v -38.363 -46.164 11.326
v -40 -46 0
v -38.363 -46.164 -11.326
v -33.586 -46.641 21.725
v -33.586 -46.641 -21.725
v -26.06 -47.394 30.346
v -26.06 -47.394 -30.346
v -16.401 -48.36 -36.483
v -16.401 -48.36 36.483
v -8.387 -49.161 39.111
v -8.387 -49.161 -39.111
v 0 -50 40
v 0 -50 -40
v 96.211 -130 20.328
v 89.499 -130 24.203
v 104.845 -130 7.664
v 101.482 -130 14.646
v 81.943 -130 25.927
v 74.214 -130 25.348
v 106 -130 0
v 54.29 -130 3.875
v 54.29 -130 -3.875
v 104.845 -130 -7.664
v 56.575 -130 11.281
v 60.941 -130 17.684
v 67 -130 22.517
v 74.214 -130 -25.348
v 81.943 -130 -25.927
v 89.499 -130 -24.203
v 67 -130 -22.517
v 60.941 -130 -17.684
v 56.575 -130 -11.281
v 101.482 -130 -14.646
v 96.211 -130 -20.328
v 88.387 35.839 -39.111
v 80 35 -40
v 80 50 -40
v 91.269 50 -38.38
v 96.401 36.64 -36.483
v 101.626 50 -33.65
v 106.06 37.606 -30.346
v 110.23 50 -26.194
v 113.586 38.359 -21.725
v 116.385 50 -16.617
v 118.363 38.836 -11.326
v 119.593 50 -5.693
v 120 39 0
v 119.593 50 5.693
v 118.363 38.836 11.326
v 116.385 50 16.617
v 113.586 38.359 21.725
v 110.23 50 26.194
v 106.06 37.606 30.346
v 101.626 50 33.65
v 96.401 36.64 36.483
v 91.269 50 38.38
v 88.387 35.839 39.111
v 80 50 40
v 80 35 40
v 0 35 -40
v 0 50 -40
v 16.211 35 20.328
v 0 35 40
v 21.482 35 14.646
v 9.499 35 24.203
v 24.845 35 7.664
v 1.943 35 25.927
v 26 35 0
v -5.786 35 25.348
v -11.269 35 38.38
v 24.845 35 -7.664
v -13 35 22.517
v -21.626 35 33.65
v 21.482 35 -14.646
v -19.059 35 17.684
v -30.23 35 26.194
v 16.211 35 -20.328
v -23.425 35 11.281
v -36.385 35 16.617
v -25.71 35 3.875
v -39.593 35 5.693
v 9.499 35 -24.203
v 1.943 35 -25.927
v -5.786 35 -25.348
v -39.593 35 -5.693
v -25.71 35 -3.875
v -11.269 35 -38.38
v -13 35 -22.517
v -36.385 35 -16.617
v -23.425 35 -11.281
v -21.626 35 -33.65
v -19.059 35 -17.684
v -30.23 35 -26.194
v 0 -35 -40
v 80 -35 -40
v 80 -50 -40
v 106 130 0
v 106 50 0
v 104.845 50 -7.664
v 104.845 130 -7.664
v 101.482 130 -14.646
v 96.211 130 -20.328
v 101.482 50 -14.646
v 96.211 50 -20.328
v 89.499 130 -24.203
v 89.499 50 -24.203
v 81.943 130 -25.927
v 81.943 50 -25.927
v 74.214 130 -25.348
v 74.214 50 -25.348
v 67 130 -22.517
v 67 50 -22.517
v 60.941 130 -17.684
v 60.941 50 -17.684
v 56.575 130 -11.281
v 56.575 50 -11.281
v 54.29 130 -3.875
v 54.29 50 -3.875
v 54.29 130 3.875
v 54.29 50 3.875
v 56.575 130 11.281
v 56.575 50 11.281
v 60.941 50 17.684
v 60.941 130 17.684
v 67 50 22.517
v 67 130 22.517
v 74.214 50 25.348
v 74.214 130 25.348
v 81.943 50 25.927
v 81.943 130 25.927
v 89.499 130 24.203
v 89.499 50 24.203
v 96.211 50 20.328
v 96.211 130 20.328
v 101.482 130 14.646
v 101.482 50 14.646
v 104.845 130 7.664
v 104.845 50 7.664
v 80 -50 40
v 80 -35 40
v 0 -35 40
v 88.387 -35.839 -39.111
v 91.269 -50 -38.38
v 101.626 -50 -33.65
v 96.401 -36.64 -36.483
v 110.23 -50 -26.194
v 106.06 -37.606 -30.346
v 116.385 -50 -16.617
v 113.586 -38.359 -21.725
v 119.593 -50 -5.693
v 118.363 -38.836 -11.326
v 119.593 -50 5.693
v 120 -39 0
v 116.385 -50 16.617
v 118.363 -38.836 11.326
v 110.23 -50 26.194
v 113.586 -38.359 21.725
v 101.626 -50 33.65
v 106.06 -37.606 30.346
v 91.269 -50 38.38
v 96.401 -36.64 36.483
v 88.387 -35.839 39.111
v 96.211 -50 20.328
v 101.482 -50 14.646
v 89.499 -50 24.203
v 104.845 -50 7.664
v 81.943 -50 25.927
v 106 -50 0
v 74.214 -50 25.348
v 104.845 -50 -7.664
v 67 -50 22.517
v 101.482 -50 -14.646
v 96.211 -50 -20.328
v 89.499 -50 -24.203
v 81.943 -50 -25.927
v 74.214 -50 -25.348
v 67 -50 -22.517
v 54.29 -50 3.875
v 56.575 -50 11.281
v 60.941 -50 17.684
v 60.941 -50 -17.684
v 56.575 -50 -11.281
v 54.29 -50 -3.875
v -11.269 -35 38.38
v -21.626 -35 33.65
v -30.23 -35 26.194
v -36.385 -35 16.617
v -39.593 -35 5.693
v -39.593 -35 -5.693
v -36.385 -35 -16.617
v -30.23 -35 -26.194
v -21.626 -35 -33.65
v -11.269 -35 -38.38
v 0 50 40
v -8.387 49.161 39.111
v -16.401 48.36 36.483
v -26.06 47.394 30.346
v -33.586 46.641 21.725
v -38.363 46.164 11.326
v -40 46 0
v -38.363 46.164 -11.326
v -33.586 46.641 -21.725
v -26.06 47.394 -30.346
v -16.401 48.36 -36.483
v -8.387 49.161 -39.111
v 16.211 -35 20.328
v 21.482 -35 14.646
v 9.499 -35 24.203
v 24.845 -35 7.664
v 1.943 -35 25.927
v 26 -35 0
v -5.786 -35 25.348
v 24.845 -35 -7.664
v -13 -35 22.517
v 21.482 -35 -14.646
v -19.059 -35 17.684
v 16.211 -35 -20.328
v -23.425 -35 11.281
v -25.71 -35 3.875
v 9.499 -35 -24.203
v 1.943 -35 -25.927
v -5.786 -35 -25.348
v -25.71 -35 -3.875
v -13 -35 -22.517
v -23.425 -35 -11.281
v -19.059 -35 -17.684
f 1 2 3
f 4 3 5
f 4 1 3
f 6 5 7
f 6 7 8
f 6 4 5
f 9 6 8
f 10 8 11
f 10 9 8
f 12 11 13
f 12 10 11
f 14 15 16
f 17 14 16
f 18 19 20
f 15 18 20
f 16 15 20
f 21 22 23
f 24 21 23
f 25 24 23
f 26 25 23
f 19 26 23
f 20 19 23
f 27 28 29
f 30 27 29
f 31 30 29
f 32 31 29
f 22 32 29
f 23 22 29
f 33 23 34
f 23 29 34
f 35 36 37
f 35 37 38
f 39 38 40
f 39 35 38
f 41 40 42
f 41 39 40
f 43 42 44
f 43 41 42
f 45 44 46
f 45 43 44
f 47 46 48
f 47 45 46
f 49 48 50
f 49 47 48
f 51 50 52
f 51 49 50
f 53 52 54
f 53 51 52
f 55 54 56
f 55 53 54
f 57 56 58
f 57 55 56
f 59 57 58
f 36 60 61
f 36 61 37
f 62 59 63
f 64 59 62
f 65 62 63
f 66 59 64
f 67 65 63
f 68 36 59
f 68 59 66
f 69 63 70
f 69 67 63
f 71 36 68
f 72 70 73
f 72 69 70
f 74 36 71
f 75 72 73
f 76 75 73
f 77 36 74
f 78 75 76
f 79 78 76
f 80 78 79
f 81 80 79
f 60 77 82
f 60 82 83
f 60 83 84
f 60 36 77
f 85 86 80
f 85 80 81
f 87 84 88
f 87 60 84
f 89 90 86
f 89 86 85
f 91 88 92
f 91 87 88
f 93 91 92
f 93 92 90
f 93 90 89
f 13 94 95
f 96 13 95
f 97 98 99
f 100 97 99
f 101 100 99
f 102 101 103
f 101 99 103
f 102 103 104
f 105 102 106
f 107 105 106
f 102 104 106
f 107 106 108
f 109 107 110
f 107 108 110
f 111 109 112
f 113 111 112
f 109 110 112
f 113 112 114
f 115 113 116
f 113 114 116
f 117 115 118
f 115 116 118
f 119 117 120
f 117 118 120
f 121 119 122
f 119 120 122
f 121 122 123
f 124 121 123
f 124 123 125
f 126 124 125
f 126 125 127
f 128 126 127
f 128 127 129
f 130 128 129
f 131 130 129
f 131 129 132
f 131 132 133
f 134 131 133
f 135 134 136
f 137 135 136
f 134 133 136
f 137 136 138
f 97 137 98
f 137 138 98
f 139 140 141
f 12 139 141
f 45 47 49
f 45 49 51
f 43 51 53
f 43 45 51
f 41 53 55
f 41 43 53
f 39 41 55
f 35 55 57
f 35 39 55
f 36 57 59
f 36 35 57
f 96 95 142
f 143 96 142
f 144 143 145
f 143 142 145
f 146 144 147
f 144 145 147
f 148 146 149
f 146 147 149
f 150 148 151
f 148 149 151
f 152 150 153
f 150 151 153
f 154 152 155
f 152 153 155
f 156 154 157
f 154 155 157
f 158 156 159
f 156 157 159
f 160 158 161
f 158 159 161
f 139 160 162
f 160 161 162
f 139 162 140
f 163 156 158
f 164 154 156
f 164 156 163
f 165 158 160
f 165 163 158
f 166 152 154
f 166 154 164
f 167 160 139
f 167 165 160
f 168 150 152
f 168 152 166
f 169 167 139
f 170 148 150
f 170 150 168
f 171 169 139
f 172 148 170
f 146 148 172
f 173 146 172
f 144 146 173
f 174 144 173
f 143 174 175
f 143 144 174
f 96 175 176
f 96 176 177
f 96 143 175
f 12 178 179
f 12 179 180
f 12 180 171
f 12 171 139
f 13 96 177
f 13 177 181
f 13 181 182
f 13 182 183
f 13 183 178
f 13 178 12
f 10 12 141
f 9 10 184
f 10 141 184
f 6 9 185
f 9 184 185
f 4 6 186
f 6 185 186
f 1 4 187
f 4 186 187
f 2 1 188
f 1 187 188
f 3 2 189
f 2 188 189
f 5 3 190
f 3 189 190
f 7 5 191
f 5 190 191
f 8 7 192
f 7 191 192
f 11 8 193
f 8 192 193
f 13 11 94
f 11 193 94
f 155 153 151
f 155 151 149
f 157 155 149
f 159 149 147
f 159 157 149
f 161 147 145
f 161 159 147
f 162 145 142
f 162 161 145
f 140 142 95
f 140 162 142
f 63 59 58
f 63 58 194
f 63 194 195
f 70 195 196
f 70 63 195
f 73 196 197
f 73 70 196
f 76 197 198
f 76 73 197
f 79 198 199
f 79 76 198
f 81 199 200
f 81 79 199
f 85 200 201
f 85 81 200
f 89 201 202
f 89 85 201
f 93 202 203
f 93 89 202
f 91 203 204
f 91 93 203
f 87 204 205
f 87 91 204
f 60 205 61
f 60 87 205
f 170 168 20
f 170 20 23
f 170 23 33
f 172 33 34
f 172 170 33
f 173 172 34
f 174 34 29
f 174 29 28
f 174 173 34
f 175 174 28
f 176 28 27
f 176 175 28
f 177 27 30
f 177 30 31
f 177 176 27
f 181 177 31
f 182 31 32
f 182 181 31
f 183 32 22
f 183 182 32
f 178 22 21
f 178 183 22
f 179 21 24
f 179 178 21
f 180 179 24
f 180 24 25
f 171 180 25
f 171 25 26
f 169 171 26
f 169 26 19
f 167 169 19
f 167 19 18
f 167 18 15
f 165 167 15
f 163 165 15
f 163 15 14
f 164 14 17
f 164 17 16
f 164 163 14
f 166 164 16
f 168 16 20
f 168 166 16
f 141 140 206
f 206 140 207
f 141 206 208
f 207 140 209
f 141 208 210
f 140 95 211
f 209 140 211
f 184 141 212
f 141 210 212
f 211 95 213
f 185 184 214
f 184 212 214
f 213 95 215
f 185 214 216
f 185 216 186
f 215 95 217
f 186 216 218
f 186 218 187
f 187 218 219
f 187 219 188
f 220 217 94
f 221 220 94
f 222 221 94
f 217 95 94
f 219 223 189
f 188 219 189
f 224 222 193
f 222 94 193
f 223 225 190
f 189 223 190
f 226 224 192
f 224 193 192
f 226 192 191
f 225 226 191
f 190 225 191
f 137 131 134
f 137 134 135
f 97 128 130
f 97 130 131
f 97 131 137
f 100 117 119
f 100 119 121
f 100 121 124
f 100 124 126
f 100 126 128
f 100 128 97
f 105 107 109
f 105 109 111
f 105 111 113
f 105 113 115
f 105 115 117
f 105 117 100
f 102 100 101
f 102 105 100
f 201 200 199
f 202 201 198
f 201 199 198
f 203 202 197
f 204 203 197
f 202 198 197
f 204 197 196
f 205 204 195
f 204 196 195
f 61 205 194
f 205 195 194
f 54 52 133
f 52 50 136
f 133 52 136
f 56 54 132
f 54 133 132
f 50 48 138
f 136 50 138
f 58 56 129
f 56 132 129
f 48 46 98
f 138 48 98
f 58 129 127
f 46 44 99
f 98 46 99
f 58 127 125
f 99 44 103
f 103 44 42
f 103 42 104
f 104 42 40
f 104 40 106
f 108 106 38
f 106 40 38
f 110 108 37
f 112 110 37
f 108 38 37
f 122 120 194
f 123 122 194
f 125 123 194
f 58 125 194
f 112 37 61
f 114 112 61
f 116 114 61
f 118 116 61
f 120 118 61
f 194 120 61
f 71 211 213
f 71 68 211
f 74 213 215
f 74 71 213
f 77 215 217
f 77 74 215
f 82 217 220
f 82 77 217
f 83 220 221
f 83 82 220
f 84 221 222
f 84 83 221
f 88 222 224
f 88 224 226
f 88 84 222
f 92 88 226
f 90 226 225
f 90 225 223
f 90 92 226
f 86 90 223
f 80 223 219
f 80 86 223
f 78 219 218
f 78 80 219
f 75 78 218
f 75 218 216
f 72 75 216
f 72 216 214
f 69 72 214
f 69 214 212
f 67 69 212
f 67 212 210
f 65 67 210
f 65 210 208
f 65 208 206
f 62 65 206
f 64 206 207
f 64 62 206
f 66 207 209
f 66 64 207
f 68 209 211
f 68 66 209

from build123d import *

# Parameters (mm, degrees)
SKETCH1_R               = 26
BOSS_EXTRUDE1_DEPTH     = 35
BOSS_EXTRUDE2_DEPTH     = 15
SKETCH5_R               = 26
BOSS_EXTRUDE3_DEPTH     = 80
CUT_EXTRUDE2_DEPTH      = 41
CUT_EXTRUDE2_DEPTH_BACK = 41


with BuildPart() as part:
    # Sketch1 → Boss-Extrude1 (new body, symmetric)
    with BuildSketch(Plane(origin=(0, 0, 0), x_dir=(1, 0, 0), z_dir=(0, 1, 0))):
        Circle(SKETCH1_R)
    extrude(amount=BOSS_EXTRUDE1_DEPTH, both=True)

    # Sketch3 → Boss-Extrude2 (add)
    with BuildSketch(Plane(origin=(0, 35, 0), x_dir=(1, 0, 0), z_dir=(0, 1, 0))):
        with BuildLine():
            Line((0, 40), (80, 40))
            ThreePointArc((80, 40), (120, 0), (80, -40))
            Line((80, -40), (0, -40))
            ThreePointArc((0, -40), (-40, 0), (0, 40))
        make_face()
    boss_extrude2 = extrude(amount=BOSS_EXTRUDE2_DEPTH)

    # Mirror2: Boss-Extrude2 across plane
    add(boss_extrude2.mirror(Plane.ZX))

    # Sketch5 → Boss-Extrude3 (add)
    with BuildSketch(Plane(origin=(0, 50, 0), x_dir=(1, 0, 0), z_dir=(0, 1, 0))):
        with Locations((80, 0)):
            Circle(SKETCH5_R)
    boss_extrude3 = extrude(amount=BOSS_EXTRUDE3_DEPTH)

    # Mirror3: Boss-Extrude3 across plane
    add(boss_extrude3.mirror(Plane.ZX))

    # Sketch6 → Cut-Extrude2 (cut, two sides)
    with BuildSketch(Plane.XY) as cut_extrude2_sk:
        Polygon((0, -50), (-40, -50), (-40, -46), align=None)
        Polygon((80, -35), (120, -35), (120, -39), align=None)
        Polygon((120, 39), (80, 35), (120, 35), align=None)
        Polygon((-40, 46), (0, 50), (-40, 50), align=None)
    extrude(amount=CUT_EXTRUDE2_DEPTH, mode=Mode.SUBTRACT)
    extrude(cut_extrude2_sk.sketch, amount=-CUT_EXTRUDE2_DEPTH_BACK, mode=Mode.SUBTRACT)


solid = part.part
